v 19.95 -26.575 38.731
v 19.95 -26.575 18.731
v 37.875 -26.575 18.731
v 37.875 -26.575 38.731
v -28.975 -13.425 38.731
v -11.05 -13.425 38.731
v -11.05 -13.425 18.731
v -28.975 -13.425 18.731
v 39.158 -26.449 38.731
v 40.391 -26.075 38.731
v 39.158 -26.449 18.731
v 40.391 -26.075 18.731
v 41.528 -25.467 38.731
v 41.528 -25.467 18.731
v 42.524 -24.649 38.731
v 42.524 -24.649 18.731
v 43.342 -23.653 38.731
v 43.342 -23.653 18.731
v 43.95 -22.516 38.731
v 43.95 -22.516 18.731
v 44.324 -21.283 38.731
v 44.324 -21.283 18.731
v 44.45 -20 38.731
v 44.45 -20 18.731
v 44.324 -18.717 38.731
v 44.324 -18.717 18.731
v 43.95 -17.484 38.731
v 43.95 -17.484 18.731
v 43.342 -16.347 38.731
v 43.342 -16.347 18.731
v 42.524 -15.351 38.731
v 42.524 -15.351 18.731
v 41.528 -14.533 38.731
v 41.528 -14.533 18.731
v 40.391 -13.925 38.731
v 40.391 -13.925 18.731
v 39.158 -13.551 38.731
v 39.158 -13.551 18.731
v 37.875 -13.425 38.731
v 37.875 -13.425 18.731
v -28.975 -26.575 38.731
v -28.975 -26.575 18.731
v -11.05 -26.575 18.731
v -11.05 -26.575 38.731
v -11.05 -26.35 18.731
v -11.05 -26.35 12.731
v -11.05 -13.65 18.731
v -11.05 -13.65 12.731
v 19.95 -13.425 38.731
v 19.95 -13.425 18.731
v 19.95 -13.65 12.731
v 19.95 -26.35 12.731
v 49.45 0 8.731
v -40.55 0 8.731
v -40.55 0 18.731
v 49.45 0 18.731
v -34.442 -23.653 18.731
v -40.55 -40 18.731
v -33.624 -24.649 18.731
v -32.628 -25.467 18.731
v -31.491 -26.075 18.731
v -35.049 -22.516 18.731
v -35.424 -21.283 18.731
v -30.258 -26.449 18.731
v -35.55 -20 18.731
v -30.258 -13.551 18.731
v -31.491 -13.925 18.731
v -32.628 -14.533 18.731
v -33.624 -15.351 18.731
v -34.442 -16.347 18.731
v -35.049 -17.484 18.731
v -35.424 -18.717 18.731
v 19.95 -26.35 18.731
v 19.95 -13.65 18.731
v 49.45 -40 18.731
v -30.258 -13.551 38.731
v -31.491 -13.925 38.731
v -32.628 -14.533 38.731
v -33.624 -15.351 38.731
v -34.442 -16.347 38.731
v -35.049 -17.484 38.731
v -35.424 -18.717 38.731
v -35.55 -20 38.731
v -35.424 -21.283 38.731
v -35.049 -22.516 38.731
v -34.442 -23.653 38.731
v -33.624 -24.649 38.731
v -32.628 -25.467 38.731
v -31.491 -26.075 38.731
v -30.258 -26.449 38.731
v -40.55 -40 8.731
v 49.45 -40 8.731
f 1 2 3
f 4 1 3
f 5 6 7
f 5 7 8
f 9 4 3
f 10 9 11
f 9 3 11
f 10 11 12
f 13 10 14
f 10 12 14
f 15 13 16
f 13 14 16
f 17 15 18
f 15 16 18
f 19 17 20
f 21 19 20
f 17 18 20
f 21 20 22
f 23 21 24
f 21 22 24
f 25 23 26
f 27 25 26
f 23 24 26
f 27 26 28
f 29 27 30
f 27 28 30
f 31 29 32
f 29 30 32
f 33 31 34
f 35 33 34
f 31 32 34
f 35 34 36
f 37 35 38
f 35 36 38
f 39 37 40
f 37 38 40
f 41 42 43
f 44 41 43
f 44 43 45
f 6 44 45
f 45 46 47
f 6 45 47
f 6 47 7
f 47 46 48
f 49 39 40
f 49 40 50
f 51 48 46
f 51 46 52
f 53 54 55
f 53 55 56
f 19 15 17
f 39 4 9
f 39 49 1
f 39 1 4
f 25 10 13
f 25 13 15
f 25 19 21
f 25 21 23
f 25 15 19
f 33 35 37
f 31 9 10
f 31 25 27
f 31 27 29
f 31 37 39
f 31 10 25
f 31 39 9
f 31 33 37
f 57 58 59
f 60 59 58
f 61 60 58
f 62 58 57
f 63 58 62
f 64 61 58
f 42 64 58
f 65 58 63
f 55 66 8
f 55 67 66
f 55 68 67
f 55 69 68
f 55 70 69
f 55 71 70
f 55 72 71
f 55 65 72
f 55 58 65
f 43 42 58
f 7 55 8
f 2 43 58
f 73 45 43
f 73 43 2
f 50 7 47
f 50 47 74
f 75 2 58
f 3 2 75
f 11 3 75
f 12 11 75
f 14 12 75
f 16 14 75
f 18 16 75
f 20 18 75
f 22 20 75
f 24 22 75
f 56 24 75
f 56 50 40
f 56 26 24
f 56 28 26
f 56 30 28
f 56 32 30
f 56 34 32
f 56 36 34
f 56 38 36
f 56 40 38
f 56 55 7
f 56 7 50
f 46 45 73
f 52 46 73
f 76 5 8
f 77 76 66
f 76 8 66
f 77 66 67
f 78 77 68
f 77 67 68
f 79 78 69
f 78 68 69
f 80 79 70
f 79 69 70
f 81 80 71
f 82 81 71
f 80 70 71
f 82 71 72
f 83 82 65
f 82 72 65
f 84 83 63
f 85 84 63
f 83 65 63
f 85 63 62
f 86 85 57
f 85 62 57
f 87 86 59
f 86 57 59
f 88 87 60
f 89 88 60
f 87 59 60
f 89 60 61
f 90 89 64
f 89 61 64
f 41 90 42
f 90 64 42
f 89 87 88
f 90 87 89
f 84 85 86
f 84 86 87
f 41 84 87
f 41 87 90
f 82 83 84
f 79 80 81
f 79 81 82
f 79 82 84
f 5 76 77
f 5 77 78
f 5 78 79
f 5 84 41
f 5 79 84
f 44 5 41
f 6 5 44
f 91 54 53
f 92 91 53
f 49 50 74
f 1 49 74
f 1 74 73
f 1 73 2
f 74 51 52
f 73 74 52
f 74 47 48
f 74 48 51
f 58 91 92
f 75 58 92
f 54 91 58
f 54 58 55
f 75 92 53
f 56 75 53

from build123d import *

# Parameters (mm, degrees)
F0_W     = 90
F0_H     = 40
F1_DEPTH = 10
F2_W     = 31
F2_H     = 12.7
F3_DEPTH = 6
F5_DEPTH = 20
F6_ANGLE = 270


with BuildPart() as f1:
    # F0 (on Front) → F1 (new body)
    with BuildSketch(Plane.XZ):
        with Locations((4.450109, -11.269131)):
            Rectangle(F0_W, F0_H)
    extrude(amount=F1_DEPTH)

    # F2 (on face) → F3 (cut)
    with BuildSketch(Plane.XZ.offset(10)):
        with Locations((4.450109, -11.269131)):
            Rectangle(F2_W, F2_H)
    extrude(amount=-F3_DEPTH, mode=Mode.SUBTRACT)

    # F4 (on face) → F5 (join)
    with BuildSketch(Plane.XZ.offset(10)):
        with BuildLine():
            ThreePointArc((37.875109, -17.844131), (44.450109, -11.269131), (37.875109, -4.694131))
            Line((37.875109, -4.694131), (19.950109, -4.694131))
            Line((19.950109, -4.694131), (19.950109, -17.844131))
            Line((19.950109, -17.844131), (37.875109, -17.844131))
        make_face()
        with BuildLine():
            Line((-28.974891, -17.844131), (-11.049891, -17.844131))
            Line((-11.049891, -17.844131), (-11.049891, -4.694131))
            Line((-11.049891, -4.694131), (-28.974891, -4.694131))
            ThreePointArc((-28.974891, -4.694131), (-35.549891, -11.269131), (-28.974891, -17.844131))
        make_face()
    extrude(amount=F5_DEPTH)


with BuildPart() as f1_1:
    # F6: moved
    add(f1.part.rotate(Axis((4.450109, 0, 8.730869), (1, 0, 0)), F6_ANGLE))


solid = f1_1.part
